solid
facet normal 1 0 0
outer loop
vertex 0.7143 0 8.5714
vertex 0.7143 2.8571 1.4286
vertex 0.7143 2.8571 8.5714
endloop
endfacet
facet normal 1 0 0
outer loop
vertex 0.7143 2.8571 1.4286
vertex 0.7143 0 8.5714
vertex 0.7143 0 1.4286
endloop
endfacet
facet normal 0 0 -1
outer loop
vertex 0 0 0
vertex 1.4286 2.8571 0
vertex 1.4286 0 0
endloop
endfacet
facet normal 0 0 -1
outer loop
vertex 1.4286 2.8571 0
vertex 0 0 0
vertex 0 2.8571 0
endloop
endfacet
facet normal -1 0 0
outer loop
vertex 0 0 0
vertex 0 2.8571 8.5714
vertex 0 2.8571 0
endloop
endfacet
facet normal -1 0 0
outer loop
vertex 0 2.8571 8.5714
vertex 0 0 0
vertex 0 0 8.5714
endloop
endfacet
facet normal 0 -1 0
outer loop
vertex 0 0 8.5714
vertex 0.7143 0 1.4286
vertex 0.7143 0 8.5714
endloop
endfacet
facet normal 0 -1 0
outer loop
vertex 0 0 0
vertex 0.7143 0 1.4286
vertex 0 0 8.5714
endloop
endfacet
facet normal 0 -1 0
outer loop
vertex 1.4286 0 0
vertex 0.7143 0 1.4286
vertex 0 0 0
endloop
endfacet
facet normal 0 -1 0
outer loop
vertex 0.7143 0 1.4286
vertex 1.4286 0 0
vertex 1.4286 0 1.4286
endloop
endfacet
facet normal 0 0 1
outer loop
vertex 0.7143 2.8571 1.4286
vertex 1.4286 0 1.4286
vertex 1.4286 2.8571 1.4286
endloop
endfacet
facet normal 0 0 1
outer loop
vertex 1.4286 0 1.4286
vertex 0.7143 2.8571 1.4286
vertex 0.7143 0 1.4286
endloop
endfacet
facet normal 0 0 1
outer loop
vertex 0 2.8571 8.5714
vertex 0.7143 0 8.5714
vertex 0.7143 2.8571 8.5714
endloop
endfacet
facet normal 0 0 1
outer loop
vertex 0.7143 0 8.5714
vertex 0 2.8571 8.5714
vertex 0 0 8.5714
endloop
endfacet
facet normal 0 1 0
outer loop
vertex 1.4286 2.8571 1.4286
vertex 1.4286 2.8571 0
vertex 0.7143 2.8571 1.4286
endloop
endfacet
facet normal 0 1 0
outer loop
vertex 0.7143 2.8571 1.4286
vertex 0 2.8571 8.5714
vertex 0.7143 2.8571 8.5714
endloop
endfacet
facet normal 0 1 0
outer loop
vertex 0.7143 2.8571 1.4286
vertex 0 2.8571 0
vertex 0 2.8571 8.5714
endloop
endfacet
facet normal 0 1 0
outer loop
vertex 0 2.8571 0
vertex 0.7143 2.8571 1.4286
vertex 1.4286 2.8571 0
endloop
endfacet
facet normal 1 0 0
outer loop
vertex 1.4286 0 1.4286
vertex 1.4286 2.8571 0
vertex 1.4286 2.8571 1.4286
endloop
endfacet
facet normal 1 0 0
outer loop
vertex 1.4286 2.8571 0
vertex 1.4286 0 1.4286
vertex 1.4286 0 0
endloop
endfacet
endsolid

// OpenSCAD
// file: hollowvoxels.scad
//wt = wall thickness
module hunitcube(wt) {
	diff = 2*wt;
	cube([1,1,1]);
	translate([wt,wt,wt])
	scale([1-diff,1-diff,1-diff])
	cube([1,1,1]);
}

module hcube(v=[1,1,1], wt) {
	for (i=[0:v[0]-1]) {
	for (j=[0:v[1]-1]) {
	for (k=[0:v[2]-1]) {
		translate([i,j,k])
		hunitcube(wt);
	}
	}
	}
}

module hcubefivesevenths(v=[1,1,1]) {
	hcube(v, 0.1*7/5);
}
// main file
use <hollowvoxels.scad>;

scale(5/7,5/7,5/7){
hcubefivesevenths([1,4,12]);
hcubefivesevenths([2,4,2]);
}
